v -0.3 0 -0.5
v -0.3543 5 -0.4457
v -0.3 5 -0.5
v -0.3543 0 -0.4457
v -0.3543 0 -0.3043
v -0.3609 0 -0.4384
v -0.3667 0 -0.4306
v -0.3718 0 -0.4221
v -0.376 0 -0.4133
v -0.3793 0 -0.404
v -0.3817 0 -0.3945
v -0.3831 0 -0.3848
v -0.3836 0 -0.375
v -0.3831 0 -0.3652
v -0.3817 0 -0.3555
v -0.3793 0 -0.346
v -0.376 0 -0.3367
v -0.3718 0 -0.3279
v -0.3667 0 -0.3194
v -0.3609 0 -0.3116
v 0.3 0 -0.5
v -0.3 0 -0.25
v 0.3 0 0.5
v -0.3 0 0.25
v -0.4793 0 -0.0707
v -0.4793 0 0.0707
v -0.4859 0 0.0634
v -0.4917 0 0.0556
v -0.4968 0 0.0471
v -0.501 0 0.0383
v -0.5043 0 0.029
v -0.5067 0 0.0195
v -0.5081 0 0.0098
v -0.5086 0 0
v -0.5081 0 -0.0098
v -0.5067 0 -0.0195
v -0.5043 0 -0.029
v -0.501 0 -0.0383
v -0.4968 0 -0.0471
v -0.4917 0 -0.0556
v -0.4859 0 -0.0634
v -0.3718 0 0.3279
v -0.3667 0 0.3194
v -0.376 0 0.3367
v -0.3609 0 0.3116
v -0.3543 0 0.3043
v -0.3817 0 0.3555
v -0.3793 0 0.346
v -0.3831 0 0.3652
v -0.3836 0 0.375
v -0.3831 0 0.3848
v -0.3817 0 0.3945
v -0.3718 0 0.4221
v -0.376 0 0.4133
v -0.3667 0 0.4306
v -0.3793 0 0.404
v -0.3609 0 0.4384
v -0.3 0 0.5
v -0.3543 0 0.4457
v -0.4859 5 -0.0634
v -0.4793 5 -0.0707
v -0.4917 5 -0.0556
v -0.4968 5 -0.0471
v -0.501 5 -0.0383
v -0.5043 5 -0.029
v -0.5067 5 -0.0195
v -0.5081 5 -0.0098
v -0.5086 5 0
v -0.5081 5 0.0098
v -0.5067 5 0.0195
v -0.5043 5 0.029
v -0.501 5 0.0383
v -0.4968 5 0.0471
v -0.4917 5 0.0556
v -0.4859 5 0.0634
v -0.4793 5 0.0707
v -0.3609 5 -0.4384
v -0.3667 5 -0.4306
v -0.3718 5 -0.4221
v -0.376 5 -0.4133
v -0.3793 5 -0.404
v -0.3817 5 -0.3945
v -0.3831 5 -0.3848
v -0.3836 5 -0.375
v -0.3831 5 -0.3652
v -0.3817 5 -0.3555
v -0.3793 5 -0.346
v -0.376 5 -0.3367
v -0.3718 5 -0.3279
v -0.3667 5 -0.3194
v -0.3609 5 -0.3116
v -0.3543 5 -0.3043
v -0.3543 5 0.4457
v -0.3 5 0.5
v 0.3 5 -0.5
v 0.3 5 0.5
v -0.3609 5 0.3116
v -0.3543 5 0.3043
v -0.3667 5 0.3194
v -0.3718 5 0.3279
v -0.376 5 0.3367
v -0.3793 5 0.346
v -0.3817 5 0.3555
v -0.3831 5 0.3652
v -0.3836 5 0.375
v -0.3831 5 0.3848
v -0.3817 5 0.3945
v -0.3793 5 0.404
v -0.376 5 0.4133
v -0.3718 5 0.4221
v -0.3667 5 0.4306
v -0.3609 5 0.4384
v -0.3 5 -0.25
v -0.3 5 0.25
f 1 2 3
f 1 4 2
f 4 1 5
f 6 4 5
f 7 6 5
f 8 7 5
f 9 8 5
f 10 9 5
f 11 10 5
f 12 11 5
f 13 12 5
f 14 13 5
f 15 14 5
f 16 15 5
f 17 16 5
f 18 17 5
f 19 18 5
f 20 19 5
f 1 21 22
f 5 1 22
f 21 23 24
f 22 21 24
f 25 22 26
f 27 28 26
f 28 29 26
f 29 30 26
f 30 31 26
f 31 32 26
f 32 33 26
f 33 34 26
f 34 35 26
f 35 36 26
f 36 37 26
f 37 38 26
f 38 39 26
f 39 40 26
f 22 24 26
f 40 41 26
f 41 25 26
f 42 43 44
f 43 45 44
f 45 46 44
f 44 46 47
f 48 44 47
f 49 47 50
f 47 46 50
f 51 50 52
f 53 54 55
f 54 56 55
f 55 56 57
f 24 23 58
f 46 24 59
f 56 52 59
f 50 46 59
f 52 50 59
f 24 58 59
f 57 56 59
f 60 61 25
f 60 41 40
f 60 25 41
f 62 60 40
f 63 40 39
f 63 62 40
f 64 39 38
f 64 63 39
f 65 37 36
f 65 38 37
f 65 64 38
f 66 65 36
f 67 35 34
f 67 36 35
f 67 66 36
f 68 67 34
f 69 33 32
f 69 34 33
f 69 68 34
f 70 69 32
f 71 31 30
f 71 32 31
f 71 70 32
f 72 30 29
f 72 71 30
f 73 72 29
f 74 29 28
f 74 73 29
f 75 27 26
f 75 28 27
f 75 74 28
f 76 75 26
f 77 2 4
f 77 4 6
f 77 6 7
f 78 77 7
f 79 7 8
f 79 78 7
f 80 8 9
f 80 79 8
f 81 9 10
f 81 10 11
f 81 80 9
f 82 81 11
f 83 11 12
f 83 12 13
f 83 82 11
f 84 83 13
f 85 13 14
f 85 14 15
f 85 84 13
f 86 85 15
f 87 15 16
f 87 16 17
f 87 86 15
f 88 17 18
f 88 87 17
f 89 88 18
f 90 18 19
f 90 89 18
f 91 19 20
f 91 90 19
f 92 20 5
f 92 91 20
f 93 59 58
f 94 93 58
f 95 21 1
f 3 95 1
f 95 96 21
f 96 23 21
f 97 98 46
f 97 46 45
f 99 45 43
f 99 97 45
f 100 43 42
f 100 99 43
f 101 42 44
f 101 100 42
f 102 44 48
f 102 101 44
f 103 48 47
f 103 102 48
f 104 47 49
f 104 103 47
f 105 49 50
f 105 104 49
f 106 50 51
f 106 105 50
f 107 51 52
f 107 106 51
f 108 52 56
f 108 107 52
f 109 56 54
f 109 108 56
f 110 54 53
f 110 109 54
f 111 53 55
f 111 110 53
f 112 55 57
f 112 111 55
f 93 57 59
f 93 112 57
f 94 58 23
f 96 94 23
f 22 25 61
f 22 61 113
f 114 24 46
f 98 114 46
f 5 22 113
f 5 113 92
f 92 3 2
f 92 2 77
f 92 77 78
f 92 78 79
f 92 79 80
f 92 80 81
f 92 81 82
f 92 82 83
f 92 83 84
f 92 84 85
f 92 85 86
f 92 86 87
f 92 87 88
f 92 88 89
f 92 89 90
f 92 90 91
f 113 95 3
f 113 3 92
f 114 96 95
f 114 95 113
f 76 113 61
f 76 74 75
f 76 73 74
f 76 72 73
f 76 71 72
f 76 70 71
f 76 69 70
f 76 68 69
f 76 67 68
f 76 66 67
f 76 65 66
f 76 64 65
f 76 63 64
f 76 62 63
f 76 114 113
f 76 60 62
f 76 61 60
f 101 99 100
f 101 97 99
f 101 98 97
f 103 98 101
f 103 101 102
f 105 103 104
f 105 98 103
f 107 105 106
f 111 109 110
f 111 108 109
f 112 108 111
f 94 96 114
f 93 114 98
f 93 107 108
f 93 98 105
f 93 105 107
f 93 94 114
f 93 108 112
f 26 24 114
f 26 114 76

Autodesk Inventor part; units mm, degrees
ref_plane "YZ Plane" through (0, 0, 0) normal (1, 0, 0) x (0, 1, 0)
ref_plane "XZ Plane" through (0, 0, 0) normal (0, 1, 0) x (-1, 0, 0)
ref_plane "XY Plane" through (0, 0, 0) normal (0, 0, 1) x (1, 0, 0)
sketch "草圖1" plane through (0, 0, 0) normal (0, 1, 0) x (-1, 0, 0)
  line L0 (-0.3, 0.5) -> (-0.3, -0.5)
  line L1 (-0.3, -0.5) -> (0.3, -0.5)
  line L2 (0.3, -0.5) -> (0.3, 0.5)
  line L3 (0.3, 0.5) -> (-0.3, 0.5)
  line L4 (-0.3, 0.5) -> (0.3, -0.5) construction
  line L5 (-0.3, -0.5) -> (0.3, 0.5) construction
  line L6 (0.3, 0.5) -> (0.3, 0.25)
  line L7 (0.3, 0.25) -> (0.3, -0.25)
  line L8 (0.3, -0.25) -> (0.3, -0.5)
  line L9 (0.3, 0.25) -> (0.55, 0)
  line L10 (0.55, 0) -> (0.3, -0.25)
  line L11 (0.3, -0.25) -> (0.425, -0.375)
  line L12 (0.425, -0.375) -> (0.3, -0.5)
  line L13 (0.3, 0.25) -> (0.425, 0.375)
  line L14 (0.425, 0.375) -> (0.3, 0.5)
  point P0 (0, 0)
  dimension "d0" = 1
  dimension "d1" = 0.6
  dimension "d2" = 0.25
  dimension "d3" = 0.5
  dimension "d4" = 45
extrude "擠出1" add sketch "草圖1" along normal blind 5
fillet "圓角1" radius 0.1 3 edges at (-0.55, 2.5, 0) (-0.425, 2.5, -0.375) (-0.425, 2.5, 0.375)
properties part number "窗間柱_無底"
